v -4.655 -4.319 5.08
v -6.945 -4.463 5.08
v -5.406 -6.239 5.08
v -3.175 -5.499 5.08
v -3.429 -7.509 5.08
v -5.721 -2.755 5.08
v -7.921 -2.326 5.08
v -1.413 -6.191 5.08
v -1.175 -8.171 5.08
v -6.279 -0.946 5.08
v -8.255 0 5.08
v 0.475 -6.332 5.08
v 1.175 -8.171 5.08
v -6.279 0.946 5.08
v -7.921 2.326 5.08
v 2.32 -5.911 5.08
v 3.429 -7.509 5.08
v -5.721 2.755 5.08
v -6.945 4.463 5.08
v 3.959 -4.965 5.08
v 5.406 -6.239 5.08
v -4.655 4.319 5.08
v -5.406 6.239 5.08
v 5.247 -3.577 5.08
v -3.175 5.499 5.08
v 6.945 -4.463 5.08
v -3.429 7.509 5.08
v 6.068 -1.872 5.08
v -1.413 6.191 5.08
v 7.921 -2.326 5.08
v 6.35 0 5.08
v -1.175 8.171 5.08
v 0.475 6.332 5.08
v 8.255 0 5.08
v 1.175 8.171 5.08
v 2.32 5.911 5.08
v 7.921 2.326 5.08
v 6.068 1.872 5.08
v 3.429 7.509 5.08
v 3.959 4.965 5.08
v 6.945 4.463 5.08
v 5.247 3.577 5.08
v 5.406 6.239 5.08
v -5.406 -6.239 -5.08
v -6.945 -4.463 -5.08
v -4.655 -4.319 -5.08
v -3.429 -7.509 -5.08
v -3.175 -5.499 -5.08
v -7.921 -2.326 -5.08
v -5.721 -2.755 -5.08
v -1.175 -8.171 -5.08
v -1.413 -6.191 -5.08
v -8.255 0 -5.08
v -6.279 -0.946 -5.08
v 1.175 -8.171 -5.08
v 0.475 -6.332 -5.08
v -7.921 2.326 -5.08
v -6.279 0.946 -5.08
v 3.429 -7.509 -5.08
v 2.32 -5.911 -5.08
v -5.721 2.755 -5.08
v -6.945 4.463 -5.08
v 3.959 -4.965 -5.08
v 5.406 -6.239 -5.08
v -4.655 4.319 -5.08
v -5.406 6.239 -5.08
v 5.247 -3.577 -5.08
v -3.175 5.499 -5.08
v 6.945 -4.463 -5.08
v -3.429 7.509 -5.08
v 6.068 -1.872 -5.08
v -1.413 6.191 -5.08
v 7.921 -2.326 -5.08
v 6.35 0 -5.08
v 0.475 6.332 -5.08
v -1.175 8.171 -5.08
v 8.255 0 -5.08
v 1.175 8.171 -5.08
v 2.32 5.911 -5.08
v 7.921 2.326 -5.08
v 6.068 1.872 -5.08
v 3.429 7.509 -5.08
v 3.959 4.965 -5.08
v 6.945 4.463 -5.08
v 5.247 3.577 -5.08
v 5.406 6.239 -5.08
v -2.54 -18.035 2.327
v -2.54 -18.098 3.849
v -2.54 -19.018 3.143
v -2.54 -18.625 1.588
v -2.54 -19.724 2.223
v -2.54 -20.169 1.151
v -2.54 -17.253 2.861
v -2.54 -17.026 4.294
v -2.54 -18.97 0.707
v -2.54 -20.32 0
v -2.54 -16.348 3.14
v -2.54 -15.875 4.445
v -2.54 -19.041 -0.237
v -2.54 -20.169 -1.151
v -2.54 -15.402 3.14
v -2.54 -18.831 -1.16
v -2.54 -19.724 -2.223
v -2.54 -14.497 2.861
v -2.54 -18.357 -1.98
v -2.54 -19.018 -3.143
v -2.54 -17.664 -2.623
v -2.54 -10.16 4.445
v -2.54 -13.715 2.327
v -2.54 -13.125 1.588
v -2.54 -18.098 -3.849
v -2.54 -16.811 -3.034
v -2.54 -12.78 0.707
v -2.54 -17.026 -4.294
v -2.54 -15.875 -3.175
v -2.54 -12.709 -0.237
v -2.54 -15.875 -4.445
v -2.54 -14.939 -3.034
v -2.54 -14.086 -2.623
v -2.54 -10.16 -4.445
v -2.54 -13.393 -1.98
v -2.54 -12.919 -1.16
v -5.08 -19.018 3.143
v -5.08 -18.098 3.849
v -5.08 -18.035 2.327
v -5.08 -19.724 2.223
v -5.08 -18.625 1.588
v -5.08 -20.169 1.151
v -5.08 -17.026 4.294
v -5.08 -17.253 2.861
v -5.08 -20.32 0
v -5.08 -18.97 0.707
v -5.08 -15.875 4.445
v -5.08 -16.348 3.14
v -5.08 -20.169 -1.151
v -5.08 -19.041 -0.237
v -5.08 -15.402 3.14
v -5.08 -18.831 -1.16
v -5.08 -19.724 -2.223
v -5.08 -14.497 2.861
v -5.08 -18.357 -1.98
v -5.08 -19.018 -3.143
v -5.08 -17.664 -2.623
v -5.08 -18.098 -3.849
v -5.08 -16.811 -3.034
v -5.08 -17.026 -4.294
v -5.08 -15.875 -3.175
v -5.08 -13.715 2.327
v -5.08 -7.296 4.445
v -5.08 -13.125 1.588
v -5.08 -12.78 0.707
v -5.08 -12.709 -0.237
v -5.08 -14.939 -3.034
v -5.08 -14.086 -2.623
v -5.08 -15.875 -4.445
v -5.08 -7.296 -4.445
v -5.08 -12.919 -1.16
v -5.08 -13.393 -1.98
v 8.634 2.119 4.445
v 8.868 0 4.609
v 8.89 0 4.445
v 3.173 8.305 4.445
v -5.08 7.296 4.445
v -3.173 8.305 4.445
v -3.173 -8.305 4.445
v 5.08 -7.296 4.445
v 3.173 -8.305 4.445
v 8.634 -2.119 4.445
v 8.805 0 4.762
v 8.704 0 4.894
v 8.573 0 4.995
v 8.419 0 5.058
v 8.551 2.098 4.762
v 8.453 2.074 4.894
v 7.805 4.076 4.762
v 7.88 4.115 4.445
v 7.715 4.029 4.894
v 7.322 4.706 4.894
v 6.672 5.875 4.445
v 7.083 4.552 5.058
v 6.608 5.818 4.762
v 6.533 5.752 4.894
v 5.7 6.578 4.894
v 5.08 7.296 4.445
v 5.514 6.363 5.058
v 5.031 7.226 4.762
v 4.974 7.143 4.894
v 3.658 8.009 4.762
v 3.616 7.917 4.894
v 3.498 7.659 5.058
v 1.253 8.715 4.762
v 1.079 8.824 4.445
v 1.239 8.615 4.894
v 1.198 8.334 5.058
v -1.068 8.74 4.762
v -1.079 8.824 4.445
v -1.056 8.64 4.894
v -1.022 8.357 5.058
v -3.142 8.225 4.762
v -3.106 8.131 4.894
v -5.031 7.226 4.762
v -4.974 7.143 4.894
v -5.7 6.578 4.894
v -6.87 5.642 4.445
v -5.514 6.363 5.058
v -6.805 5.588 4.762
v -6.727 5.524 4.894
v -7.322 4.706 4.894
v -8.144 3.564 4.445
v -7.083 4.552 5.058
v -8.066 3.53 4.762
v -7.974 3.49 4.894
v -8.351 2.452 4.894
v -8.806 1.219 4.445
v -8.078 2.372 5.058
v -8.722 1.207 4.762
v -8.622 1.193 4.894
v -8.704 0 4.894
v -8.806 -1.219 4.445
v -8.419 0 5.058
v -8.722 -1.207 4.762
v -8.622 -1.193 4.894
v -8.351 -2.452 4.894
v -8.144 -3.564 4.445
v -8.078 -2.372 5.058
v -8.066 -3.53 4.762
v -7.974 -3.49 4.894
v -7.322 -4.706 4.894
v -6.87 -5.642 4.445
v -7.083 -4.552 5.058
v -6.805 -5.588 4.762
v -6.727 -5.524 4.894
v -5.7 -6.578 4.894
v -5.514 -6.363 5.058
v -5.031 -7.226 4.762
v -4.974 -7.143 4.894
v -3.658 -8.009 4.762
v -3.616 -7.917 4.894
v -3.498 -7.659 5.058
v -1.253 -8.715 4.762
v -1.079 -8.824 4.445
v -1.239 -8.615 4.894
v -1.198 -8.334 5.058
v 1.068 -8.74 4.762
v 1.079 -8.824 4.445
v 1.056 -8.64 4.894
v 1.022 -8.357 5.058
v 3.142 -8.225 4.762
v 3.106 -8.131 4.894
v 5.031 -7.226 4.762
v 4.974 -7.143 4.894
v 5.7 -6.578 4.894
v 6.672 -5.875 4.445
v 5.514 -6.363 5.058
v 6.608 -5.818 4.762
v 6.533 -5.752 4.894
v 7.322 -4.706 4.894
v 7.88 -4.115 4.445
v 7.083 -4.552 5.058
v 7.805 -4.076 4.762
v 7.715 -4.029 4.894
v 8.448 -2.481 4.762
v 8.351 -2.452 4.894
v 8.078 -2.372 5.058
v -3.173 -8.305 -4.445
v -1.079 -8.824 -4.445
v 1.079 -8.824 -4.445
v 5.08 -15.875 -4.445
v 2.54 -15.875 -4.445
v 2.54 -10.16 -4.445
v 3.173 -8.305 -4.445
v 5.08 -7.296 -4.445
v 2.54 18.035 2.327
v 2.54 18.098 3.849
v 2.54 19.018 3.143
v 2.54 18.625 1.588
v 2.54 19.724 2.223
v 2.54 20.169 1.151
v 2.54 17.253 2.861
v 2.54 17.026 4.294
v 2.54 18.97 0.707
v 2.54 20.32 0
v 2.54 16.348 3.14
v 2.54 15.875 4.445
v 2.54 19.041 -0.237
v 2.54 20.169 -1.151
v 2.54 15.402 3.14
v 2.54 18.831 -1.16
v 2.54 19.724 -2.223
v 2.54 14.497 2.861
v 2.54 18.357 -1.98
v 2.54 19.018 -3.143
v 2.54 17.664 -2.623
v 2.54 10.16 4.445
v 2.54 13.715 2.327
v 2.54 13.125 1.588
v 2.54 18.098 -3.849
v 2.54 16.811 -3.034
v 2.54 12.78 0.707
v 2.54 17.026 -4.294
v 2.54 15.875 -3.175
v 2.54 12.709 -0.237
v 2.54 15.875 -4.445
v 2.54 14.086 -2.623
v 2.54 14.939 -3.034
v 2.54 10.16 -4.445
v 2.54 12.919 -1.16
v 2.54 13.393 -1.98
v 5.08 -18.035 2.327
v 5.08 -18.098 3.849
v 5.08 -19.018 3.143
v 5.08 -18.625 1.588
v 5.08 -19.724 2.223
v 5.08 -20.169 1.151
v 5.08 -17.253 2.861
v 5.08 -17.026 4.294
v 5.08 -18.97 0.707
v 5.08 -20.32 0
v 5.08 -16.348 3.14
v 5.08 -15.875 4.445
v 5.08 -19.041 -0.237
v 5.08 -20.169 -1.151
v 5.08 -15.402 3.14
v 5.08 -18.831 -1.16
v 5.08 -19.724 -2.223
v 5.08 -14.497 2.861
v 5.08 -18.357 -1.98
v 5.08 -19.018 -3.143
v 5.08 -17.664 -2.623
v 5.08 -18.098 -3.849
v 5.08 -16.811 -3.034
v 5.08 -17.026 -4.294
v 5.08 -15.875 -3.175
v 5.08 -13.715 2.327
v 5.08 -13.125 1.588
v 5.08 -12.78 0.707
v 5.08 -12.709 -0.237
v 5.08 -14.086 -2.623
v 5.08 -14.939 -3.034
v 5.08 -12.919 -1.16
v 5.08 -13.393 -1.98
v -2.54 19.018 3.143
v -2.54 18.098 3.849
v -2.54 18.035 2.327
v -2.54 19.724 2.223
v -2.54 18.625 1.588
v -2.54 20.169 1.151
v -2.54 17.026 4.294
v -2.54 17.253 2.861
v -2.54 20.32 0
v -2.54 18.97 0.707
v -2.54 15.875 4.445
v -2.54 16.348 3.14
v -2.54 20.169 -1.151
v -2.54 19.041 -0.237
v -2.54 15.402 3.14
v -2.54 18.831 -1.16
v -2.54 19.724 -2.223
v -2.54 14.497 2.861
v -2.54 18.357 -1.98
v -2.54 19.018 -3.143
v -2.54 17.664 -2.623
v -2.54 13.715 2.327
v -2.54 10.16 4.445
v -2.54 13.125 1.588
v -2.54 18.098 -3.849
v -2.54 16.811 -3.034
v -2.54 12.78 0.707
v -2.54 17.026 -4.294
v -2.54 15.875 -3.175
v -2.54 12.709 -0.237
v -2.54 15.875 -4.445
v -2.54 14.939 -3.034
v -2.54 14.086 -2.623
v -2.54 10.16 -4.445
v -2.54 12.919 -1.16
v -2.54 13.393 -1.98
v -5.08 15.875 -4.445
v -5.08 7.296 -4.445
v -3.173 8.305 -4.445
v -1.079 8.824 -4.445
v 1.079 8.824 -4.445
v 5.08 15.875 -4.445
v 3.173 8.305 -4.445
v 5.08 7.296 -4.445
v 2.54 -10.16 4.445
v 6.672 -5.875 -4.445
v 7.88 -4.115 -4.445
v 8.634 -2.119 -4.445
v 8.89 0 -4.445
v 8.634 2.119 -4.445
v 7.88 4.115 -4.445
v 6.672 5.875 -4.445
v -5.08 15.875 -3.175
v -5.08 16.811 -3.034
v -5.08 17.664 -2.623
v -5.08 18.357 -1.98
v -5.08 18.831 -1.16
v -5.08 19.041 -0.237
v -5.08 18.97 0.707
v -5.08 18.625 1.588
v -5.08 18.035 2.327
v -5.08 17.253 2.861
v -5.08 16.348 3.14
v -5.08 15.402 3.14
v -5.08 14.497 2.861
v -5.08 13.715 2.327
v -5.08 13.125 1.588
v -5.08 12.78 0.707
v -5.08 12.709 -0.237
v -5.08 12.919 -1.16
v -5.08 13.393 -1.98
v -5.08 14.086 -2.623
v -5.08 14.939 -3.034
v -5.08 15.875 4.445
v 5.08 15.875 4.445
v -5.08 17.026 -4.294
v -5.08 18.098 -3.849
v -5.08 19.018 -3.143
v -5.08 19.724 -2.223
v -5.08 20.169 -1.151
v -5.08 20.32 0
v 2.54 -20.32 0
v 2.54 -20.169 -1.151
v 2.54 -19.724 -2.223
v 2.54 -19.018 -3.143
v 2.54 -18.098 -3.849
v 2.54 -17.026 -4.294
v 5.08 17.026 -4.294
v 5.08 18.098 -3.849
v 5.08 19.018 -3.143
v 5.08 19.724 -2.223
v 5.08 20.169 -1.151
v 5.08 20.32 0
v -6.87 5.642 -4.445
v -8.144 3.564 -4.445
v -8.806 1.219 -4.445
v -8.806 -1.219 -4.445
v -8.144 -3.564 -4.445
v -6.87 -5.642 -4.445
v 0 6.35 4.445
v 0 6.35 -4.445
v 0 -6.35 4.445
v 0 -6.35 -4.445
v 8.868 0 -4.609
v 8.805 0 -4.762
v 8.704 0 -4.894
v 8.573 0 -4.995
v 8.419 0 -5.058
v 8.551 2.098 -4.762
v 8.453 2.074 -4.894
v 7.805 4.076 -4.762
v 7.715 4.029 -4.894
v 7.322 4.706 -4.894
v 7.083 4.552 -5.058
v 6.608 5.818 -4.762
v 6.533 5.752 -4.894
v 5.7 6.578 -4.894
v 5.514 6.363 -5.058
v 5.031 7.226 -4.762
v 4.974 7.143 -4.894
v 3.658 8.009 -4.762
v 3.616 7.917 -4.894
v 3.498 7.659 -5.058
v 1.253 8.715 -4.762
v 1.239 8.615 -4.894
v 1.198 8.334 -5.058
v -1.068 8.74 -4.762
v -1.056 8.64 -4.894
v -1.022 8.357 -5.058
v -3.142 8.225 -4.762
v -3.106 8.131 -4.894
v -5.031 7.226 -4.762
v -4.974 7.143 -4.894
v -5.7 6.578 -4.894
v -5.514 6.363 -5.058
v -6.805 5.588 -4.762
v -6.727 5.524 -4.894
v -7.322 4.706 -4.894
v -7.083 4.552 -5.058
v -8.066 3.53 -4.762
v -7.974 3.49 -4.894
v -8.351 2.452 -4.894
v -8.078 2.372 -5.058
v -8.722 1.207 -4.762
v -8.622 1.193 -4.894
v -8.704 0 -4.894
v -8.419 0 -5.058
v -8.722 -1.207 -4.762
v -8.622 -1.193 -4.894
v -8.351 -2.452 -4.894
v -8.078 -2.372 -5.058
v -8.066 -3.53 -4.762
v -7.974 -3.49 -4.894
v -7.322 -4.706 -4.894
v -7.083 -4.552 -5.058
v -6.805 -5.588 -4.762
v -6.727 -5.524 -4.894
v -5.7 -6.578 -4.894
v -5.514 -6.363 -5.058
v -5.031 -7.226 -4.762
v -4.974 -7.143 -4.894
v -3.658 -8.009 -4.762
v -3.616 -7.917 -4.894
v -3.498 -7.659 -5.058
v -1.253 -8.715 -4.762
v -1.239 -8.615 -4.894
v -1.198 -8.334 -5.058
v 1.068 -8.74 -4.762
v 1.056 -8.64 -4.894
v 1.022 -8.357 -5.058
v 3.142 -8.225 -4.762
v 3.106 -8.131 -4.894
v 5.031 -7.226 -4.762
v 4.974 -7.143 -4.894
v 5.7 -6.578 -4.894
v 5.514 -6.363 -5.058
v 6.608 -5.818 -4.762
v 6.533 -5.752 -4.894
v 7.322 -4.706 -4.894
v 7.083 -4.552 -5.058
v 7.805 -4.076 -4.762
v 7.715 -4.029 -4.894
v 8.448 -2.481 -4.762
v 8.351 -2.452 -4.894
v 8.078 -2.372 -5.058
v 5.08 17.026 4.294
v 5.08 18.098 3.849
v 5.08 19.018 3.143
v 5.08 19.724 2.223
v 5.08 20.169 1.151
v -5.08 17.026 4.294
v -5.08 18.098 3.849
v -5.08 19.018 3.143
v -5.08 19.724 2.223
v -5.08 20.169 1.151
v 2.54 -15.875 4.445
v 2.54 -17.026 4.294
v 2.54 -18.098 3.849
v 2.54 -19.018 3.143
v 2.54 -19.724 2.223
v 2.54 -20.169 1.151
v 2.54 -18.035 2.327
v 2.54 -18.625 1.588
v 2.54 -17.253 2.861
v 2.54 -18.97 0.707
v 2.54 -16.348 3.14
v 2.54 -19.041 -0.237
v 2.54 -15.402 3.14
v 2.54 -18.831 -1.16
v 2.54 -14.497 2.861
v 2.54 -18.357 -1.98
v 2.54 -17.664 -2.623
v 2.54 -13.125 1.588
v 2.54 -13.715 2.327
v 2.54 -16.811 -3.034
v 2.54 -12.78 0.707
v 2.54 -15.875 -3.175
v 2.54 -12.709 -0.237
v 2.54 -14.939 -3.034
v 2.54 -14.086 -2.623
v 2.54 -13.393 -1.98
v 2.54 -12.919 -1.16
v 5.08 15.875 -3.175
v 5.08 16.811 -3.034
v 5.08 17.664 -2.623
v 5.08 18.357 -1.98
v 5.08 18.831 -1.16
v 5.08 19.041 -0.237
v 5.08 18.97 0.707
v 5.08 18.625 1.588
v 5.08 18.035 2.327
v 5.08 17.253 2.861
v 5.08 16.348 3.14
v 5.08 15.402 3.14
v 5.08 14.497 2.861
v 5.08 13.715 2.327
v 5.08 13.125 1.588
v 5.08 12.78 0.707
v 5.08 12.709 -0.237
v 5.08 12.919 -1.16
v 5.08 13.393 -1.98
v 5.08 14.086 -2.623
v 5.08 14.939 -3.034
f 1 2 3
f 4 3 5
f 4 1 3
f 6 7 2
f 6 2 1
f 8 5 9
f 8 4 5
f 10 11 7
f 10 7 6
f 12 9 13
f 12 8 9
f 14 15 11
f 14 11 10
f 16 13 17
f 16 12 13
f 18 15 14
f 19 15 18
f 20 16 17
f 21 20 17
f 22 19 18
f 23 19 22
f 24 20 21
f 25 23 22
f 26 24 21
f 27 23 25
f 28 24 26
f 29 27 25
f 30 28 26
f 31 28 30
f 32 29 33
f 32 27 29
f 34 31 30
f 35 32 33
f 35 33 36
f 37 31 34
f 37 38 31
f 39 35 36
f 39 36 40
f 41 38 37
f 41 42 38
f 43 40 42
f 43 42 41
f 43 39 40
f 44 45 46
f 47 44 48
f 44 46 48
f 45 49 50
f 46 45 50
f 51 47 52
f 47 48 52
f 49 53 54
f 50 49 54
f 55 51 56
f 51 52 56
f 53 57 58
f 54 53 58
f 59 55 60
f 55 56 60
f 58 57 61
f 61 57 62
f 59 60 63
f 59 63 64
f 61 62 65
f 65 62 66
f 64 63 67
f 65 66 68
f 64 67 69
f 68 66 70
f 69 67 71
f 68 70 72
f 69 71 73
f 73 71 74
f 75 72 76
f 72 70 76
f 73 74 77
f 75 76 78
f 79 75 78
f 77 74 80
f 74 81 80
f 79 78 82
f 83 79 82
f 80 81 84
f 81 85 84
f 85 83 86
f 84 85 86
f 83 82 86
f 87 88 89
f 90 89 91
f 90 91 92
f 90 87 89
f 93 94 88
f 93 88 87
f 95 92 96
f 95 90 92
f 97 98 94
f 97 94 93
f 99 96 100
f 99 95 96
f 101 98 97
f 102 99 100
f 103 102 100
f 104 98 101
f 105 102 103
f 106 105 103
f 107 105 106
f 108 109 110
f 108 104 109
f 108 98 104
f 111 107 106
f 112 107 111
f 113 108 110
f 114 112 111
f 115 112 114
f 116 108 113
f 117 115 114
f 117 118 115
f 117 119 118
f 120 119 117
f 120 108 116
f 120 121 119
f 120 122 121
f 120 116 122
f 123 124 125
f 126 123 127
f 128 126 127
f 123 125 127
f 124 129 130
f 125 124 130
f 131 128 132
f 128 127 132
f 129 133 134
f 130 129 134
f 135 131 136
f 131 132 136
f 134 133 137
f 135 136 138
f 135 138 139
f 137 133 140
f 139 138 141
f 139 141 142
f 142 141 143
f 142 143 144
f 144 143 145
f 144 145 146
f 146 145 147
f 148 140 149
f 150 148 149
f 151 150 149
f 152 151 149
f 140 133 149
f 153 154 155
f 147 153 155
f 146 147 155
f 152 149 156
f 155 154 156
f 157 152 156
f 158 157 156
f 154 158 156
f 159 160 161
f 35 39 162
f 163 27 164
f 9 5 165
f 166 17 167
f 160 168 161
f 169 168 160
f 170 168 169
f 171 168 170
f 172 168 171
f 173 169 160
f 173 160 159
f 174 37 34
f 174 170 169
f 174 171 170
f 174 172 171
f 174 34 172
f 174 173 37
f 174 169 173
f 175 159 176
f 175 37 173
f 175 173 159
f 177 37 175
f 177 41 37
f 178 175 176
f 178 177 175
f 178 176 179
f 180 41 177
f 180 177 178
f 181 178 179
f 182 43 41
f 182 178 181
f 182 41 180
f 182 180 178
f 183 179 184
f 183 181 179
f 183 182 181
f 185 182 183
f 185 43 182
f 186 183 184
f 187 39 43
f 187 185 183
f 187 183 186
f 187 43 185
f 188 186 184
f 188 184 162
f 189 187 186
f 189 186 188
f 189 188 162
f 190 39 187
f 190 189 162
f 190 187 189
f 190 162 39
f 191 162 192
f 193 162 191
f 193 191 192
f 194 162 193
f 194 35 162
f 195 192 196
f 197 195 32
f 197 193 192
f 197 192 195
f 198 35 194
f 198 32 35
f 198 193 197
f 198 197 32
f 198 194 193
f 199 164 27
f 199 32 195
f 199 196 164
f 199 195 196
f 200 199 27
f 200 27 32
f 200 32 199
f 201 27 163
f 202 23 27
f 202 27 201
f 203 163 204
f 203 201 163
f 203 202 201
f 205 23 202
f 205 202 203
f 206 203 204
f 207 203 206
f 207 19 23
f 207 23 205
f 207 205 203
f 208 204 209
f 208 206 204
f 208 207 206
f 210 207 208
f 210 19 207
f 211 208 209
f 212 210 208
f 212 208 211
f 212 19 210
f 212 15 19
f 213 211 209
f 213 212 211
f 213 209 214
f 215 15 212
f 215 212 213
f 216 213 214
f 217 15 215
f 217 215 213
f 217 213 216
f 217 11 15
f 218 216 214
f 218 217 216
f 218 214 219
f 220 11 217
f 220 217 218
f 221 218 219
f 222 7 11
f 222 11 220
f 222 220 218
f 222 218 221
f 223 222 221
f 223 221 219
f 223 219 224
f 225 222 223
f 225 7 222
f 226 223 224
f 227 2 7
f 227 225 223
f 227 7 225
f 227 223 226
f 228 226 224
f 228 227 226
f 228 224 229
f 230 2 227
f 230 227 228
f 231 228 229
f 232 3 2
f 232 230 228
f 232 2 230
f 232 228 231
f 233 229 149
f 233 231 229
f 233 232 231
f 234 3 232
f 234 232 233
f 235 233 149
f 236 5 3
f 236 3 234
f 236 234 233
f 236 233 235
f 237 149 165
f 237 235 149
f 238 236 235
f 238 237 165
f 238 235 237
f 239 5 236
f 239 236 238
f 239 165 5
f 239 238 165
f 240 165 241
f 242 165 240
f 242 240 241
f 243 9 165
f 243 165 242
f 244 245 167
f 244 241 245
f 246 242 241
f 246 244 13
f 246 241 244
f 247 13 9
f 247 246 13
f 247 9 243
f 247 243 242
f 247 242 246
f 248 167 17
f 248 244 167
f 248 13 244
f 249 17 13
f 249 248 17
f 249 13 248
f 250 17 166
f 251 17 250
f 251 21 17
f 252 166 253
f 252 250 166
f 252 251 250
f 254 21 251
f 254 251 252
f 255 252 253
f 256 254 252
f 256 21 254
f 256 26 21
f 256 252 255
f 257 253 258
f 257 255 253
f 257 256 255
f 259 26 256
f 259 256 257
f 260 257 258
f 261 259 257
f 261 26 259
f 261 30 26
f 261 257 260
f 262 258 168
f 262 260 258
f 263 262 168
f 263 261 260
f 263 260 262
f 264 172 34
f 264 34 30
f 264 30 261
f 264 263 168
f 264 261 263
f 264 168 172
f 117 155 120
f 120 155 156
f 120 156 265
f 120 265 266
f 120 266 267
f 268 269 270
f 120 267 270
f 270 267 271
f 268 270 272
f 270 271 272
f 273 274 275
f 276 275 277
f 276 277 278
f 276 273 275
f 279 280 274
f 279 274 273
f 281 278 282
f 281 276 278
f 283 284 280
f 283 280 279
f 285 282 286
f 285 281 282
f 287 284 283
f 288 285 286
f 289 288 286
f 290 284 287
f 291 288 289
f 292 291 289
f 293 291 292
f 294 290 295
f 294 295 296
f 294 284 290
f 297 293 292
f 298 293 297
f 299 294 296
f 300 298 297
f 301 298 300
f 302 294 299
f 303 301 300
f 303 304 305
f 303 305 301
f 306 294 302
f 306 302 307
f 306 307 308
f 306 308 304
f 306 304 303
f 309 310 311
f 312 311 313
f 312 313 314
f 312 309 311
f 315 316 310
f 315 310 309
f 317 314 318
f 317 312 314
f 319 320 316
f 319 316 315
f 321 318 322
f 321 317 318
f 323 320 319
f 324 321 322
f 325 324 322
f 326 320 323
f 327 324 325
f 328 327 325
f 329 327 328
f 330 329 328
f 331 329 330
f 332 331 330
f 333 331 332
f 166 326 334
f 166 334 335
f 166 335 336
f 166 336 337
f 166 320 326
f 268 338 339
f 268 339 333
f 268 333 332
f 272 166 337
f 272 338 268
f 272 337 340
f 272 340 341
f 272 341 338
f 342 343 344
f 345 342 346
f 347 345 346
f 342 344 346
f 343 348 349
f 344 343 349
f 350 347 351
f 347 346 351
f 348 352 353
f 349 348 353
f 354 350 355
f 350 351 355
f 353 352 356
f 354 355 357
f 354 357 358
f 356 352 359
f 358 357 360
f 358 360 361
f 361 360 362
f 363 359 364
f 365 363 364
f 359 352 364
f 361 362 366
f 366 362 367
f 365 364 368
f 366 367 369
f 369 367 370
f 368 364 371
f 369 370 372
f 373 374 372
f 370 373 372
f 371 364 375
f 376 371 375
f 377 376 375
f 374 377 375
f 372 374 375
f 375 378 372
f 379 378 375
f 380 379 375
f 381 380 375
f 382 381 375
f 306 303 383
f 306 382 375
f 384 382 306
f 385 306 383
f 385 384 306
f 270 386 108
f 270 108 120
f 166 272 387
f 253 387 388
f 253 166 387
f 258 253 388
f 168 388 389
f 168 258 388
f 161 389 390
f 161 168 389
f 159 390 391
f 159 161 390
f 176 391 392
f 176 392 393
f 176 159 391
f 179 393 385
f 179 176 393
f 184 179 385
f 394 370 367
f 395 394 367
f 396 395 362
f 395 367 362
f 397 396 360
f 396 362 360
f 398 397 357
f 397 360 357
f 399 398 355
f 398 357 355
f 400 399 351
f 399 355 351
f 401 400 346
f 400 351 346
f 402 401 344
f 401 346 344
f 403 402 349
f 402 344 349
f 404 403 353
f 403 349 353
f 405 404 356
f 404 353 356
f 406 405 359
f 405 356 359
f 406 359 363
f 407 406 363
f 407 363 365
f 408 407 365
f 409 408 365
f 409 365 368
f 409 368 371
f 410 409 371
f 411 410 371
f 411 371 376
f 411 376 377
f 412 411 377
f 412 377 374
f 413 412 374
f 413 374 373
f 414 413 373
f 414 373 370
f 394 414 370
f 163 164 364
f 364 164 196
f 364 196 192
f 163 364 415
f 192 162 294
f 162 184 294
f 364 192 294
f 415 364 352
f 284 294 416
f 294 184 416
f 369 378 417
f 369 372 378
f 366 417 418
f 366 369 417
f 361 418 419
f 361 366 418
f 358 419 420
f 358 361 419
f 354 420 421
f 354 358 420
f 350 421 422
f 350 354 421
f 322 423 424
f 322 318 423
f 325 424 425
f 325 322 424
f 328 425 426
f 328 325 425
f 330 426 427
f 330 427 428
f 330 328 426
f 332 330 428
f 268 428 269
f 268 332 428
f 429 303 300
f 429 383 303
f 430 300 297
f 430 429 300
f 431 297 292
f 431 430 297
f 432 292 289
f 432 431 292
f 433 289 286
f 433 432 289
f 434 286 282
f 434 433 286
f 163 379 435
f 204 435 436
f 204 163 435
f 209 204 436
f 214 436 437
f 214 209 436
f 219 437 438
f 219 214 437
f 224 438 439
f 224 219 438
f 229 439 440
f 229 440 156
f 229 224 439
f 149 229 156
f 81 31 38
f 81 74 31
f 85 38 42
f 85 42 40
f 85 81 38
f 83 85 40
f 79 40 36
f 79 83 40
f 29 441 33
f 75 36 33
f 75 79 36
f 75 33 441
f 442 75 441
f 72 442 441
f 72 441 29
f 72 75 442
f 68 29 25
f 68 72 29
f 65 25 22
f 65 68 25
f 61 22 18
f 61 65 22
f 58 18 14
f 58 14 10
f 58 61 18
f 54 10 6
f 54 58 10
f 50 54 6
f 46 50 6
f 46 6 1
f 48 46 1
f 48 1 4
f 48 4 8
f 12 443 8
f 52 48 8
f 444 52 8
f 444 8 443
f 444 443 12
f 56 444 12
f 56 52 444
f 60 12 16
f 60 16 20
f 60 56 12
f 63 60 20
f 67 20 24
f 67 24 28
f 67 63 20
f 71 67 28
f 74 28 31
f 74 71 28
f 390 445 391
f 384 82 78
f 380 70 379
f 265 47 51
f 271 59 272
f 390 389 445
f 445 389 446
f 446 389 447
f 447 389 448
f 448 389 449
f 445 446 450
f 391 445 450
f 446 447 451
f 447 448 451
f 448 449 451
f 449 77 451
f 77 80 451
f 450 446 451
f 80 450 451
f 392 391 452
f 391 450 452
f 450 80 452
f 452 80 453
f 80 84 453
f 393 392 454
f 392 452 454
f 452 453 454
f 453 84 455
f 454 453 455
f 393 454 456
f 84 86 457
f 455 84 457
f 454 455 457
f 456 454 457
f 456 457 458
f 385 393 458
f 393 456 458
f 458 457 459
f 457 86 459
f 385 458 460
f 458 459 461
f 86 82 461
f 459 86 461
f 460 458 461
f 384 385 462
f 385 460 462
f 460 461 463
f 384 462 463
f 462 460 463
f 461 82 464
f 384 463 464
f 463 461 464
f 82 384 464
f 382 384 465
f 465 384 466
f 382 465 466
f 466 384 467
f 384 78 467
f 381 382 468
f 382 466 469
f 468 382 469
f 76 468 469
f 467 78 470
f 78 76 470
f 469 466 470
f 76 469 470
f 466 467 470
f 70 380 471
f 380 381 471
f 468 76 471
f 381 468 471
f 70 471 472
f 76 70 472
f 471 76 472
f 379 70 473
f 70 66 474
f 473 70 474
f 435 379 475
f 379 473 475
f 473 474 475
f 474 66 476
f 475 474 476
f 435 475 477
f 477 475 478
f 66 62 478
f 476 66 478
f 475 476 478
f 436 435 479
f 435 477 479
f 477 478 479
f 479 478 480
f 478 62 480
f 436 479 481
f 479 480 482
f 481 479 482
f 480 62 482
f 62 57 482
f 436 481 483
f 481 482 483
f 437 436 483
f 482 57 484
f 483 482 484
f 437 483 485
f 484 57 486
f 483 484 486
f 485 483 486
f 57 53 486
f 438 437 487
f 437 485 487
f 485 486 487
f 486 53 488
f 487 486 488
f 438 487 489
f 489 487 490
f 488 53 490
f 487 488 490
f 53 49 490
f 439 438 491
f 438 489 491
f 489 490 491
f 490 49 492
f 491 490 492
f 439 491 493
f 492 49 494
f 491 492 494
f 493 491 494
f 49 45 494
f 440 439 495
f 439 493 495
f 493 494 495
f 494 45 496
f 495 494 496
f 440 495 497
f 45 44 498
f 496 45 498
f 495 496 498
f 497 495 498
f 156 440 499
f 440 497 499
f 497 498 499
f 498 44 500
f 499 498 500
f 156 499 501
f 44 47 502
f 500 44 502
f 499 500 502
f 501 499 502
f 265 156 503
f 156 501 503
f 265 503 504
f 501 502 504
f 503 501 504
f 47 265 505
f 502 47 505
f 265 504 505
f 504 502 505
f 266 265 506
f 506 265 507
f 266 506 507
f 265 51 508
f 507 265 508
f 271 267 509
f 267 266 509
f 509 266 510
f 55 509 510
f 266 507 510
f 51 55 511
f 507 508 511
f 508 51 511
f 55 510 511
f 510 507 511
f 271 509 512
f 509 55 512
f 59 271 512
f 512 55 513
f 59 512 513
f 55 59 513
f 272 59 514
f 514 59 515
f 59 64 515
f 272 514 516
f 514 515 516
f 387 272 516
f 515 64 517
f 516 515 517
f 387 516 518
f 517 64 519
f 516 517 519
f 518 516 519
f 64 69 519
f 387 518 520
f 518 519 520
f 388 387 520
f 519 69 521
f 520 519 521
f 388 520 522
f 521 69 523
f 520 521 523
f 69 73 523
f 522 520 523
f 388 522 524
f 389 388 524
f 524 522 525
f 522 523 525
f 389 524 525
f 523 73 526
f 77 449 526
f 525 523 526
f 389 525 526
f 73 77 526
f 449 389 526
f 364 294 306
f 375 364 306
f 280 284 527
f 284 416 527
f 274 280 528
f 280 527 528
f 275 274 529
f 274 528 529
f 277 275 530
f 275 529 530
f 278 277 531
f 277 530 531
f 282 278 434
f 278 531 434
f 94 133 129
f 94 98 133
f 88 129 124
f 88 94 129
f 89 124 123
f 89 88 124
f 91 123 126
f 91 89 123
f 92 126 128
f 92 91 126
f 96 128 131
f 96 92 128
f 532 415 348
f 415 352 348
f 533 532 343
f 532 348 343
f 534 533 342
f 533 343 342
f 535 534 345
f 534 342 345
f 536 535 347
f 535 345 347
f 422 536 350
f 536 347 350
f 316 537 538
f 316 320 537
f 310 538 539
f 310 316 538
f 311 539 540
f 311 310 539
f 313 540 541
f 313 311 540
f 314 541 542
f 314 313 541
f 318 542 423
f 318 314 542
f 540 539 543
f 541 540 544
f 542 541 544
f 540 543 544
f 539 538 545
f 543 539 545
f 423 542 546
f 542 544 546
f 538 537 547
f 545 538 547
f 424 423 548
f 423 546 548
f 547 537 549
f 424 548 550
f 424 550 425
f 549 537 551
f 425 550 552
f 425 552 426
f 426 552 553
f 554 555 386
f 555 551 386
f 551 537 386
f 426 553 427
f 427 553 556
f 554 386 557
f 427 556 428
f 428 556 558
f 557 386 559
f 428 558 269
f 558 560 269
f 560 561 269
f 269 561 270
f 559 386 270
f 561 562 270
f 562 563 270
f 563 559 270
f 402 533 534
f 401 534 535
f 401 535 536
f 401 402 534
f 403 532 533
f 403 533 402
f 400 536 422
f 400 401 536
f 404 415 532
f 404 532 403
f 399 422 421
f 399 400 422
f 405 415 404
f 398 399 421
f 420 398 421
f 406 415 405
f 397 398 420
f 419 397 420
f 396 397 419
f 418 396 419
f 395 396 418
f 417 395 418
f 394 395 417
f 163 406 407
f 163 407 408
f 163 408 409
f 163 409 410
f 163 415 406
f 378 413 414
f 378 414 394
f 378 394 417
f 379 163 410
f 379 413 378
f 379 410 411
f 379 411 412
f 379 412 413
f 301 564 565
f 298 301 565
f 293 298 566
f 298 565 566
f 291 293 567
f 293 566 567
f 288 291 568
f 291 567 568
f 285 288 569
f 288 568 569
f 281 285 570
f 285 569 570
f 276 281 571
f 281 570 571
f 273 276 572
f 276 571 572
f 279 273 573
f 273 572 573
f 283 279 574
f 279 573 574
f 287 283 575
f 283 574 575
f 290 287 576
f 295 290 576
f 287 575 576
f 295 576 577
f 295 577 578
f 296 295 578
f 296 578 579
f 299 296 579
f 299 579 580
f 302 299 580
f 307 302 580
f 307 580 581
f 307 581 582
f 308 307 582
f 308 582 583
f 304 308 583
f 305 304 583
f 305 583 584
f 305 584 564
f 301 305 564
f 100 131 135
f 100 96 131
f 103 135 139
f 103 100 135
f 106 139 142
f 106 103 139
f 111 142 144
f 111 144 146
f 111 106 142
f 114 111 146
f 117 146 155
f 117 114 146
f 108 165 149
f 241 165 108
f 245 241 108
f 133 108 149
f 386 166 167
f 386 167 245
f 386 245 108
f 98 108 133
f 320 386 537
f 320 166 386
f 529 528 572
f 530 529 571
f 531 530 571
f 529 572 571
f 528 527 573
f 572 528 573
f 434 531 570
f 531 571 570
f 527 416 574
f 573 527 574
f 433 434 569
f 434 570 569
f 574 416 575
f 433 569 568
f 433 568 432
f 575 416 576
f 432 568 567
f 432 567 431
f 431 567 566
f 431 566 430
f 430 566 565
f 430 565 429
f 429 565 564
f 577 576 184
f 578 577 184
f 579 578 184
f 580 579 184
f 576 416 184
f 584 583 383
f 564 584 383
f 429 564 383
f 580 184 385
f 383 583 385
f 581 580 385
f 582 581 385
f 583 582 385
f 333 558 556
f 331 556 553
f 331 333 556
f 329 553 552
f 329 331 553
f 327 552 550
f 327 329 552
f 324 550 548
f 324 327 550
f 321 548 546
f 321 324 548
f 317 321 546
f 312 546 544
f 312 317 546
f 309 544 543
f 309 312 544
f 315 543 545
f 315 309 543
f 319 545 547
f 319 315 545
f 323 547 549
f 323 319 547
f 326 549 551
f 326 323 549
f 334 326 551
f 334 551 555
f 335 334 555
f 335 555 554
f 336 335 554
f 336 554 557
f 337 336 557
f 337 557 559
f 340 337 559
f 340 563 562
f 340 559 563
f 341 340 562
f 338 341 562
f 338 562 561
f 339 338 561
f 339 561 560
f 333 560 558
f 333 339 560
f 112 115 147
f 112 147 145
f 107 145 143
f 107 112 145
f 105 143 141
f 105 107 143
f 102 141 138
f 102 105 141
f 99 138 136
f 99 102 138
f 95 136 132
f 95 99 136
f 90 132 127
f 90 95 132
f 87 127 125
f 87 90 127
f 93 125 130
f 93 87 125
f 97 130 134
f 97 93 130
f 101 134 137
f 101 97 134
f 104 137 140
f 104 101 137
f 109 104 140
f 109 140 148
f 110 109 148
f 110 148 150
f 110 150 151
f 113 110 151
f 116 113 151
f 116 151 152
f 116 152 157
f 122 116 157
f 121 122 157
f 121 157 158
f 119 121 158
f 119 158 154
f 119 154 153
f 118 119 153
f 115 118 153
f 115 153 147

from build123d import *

# Parameters (mm, degrees)
SKETCH1_R            = 8.89
SKETCH1_R_2          = 6.35
BOSS_EXTRUDE1_DEPTH  = 5.08
FILLET1_R            = 0.635
SKETCH2_W            = 8.89
SKETCH2_H            = 3.81
BOSS_EXTRUDE2_DEPTH  = 3.81
BOSS_EXTRUDE3_START  = -3.175
SKETCH3_W            = 2.54
SKETCH3_H            = 8.89
BOSS_EXTRUDE3_DEPTH  = 13.335
FILLET2_R            = 4.445
SKETCH4_R            = 3.175
CUT_EXTRUDE1_DEPTH   = 10.16
FILLET2_OF_MIRROR1_R = 4.445


with BuildPart() as part:
    # Sketch1 → Boss-Extrude1 (new, symmetric)
    with BuildSketch(Plane.XY):
        Circle(SKETCH1_R)
        Circle(SKETCH1_R_2, mode=Mode.SUBTRACT)
    extrude(amount=BOSS_EXTRUDE1_DEPTH, both=True)

    # Fillet1
    fillet1_edges = [part.edges().sort_by_distance(p)[0] for p in [
        (-8.89, 0, -5.08),
        (-8.89, 0, 5.08),
    ]]
    fillet(fillet1_edges, radius=FILLET1_R)

    # Sketch2 → Boss-Extrude2 (add, symmetric)
    with BuildSketch(Plane(origin=(0, 0, 0), x_dir=(0, 0, -1), z_dir=(1, 0, 0))):
        with Locations((0, 8.255)):
            Rectangle(SKETCH2_W, SKETCH2_H)
    boss_extrude2 = extrude(amount=BOSS_EXTRUDE2_DEPTH, both=True)

    # Sketch3 → Boss-Extrude3 (add)
    with BuildSketch(Plane(origin=(0, 10.16, 0), x_dir=(1, 0, 0), z_dir=(0, 1, 0)).offset(BOSS_EXTRUDE3_START)):
        with Locations((3.81, 0)):
            Rectangle(SKETCH3_W, SKETCH3_H)
        with Locations((-3.81, 0)):
            Rectangle(SKETCH3_W, SKETCH3_H)
    boss_extrude3 = extrude(amount=BOSS_EXTRUDE3_DEPTH)

    # Fillet2
    fillet2_edges = [part.edges().sort_by_distance(p)[0] for p in [
        (-3.81, 20.32, -4.445),
        (-3.81, 20.32, 4.445),
        (3.81, 20.32, -4.445),
        (3.81, 20.32, 4.445),
    ]]
    fillet(fillet2_edges, radius=FILLET2_R - 0.0001)  # a hair under: the kernel refuses the full size

    # Sketch4 → Cut-Extrude1 (cut)
    with BuildSketch(Plane(origin=(5.08, 0, 0), x_dir=(0, 0, -1), z_dir=(1, 0, 0))):
        with Locations((0, 15.875)):
            Circle(SKETCH4_R)
    cut_extrude1 = extrude(amount=-CUT_EXTRUDE1_DEPTH, mode=Mode.SUBTRACT)

    # Mirror1: Boss-Extrude2, Boss-Extrude3, Cut-Extrude1 across plane
    add(boss_extrude2.mirror(Plane.ZX))
    add(boss_extrude3.mirror(Plane.ZX))
    add(cut_extrude1.mirror(Plane.ZX), mode=Mode.SUBTRACT)

    # Fillet2 of Mirror1
    fillet2_of_mirror1_edges = [part.edges().sort_by_distance(p)[0] for p in [
        (-3.81, -20.32, -4.445),
        (-3.81, -20.32, 4.445),
        (3.81, -20.32, -4.445),
        (3.81, -20.32, 4.445),
    ]]
    fillet(fillet2_of_mirror1_edges, radius=FILLET2_OF_MIRROR1_R - 0.0001)  # a hair under: the kernel refuses the full size


solid = part.part
